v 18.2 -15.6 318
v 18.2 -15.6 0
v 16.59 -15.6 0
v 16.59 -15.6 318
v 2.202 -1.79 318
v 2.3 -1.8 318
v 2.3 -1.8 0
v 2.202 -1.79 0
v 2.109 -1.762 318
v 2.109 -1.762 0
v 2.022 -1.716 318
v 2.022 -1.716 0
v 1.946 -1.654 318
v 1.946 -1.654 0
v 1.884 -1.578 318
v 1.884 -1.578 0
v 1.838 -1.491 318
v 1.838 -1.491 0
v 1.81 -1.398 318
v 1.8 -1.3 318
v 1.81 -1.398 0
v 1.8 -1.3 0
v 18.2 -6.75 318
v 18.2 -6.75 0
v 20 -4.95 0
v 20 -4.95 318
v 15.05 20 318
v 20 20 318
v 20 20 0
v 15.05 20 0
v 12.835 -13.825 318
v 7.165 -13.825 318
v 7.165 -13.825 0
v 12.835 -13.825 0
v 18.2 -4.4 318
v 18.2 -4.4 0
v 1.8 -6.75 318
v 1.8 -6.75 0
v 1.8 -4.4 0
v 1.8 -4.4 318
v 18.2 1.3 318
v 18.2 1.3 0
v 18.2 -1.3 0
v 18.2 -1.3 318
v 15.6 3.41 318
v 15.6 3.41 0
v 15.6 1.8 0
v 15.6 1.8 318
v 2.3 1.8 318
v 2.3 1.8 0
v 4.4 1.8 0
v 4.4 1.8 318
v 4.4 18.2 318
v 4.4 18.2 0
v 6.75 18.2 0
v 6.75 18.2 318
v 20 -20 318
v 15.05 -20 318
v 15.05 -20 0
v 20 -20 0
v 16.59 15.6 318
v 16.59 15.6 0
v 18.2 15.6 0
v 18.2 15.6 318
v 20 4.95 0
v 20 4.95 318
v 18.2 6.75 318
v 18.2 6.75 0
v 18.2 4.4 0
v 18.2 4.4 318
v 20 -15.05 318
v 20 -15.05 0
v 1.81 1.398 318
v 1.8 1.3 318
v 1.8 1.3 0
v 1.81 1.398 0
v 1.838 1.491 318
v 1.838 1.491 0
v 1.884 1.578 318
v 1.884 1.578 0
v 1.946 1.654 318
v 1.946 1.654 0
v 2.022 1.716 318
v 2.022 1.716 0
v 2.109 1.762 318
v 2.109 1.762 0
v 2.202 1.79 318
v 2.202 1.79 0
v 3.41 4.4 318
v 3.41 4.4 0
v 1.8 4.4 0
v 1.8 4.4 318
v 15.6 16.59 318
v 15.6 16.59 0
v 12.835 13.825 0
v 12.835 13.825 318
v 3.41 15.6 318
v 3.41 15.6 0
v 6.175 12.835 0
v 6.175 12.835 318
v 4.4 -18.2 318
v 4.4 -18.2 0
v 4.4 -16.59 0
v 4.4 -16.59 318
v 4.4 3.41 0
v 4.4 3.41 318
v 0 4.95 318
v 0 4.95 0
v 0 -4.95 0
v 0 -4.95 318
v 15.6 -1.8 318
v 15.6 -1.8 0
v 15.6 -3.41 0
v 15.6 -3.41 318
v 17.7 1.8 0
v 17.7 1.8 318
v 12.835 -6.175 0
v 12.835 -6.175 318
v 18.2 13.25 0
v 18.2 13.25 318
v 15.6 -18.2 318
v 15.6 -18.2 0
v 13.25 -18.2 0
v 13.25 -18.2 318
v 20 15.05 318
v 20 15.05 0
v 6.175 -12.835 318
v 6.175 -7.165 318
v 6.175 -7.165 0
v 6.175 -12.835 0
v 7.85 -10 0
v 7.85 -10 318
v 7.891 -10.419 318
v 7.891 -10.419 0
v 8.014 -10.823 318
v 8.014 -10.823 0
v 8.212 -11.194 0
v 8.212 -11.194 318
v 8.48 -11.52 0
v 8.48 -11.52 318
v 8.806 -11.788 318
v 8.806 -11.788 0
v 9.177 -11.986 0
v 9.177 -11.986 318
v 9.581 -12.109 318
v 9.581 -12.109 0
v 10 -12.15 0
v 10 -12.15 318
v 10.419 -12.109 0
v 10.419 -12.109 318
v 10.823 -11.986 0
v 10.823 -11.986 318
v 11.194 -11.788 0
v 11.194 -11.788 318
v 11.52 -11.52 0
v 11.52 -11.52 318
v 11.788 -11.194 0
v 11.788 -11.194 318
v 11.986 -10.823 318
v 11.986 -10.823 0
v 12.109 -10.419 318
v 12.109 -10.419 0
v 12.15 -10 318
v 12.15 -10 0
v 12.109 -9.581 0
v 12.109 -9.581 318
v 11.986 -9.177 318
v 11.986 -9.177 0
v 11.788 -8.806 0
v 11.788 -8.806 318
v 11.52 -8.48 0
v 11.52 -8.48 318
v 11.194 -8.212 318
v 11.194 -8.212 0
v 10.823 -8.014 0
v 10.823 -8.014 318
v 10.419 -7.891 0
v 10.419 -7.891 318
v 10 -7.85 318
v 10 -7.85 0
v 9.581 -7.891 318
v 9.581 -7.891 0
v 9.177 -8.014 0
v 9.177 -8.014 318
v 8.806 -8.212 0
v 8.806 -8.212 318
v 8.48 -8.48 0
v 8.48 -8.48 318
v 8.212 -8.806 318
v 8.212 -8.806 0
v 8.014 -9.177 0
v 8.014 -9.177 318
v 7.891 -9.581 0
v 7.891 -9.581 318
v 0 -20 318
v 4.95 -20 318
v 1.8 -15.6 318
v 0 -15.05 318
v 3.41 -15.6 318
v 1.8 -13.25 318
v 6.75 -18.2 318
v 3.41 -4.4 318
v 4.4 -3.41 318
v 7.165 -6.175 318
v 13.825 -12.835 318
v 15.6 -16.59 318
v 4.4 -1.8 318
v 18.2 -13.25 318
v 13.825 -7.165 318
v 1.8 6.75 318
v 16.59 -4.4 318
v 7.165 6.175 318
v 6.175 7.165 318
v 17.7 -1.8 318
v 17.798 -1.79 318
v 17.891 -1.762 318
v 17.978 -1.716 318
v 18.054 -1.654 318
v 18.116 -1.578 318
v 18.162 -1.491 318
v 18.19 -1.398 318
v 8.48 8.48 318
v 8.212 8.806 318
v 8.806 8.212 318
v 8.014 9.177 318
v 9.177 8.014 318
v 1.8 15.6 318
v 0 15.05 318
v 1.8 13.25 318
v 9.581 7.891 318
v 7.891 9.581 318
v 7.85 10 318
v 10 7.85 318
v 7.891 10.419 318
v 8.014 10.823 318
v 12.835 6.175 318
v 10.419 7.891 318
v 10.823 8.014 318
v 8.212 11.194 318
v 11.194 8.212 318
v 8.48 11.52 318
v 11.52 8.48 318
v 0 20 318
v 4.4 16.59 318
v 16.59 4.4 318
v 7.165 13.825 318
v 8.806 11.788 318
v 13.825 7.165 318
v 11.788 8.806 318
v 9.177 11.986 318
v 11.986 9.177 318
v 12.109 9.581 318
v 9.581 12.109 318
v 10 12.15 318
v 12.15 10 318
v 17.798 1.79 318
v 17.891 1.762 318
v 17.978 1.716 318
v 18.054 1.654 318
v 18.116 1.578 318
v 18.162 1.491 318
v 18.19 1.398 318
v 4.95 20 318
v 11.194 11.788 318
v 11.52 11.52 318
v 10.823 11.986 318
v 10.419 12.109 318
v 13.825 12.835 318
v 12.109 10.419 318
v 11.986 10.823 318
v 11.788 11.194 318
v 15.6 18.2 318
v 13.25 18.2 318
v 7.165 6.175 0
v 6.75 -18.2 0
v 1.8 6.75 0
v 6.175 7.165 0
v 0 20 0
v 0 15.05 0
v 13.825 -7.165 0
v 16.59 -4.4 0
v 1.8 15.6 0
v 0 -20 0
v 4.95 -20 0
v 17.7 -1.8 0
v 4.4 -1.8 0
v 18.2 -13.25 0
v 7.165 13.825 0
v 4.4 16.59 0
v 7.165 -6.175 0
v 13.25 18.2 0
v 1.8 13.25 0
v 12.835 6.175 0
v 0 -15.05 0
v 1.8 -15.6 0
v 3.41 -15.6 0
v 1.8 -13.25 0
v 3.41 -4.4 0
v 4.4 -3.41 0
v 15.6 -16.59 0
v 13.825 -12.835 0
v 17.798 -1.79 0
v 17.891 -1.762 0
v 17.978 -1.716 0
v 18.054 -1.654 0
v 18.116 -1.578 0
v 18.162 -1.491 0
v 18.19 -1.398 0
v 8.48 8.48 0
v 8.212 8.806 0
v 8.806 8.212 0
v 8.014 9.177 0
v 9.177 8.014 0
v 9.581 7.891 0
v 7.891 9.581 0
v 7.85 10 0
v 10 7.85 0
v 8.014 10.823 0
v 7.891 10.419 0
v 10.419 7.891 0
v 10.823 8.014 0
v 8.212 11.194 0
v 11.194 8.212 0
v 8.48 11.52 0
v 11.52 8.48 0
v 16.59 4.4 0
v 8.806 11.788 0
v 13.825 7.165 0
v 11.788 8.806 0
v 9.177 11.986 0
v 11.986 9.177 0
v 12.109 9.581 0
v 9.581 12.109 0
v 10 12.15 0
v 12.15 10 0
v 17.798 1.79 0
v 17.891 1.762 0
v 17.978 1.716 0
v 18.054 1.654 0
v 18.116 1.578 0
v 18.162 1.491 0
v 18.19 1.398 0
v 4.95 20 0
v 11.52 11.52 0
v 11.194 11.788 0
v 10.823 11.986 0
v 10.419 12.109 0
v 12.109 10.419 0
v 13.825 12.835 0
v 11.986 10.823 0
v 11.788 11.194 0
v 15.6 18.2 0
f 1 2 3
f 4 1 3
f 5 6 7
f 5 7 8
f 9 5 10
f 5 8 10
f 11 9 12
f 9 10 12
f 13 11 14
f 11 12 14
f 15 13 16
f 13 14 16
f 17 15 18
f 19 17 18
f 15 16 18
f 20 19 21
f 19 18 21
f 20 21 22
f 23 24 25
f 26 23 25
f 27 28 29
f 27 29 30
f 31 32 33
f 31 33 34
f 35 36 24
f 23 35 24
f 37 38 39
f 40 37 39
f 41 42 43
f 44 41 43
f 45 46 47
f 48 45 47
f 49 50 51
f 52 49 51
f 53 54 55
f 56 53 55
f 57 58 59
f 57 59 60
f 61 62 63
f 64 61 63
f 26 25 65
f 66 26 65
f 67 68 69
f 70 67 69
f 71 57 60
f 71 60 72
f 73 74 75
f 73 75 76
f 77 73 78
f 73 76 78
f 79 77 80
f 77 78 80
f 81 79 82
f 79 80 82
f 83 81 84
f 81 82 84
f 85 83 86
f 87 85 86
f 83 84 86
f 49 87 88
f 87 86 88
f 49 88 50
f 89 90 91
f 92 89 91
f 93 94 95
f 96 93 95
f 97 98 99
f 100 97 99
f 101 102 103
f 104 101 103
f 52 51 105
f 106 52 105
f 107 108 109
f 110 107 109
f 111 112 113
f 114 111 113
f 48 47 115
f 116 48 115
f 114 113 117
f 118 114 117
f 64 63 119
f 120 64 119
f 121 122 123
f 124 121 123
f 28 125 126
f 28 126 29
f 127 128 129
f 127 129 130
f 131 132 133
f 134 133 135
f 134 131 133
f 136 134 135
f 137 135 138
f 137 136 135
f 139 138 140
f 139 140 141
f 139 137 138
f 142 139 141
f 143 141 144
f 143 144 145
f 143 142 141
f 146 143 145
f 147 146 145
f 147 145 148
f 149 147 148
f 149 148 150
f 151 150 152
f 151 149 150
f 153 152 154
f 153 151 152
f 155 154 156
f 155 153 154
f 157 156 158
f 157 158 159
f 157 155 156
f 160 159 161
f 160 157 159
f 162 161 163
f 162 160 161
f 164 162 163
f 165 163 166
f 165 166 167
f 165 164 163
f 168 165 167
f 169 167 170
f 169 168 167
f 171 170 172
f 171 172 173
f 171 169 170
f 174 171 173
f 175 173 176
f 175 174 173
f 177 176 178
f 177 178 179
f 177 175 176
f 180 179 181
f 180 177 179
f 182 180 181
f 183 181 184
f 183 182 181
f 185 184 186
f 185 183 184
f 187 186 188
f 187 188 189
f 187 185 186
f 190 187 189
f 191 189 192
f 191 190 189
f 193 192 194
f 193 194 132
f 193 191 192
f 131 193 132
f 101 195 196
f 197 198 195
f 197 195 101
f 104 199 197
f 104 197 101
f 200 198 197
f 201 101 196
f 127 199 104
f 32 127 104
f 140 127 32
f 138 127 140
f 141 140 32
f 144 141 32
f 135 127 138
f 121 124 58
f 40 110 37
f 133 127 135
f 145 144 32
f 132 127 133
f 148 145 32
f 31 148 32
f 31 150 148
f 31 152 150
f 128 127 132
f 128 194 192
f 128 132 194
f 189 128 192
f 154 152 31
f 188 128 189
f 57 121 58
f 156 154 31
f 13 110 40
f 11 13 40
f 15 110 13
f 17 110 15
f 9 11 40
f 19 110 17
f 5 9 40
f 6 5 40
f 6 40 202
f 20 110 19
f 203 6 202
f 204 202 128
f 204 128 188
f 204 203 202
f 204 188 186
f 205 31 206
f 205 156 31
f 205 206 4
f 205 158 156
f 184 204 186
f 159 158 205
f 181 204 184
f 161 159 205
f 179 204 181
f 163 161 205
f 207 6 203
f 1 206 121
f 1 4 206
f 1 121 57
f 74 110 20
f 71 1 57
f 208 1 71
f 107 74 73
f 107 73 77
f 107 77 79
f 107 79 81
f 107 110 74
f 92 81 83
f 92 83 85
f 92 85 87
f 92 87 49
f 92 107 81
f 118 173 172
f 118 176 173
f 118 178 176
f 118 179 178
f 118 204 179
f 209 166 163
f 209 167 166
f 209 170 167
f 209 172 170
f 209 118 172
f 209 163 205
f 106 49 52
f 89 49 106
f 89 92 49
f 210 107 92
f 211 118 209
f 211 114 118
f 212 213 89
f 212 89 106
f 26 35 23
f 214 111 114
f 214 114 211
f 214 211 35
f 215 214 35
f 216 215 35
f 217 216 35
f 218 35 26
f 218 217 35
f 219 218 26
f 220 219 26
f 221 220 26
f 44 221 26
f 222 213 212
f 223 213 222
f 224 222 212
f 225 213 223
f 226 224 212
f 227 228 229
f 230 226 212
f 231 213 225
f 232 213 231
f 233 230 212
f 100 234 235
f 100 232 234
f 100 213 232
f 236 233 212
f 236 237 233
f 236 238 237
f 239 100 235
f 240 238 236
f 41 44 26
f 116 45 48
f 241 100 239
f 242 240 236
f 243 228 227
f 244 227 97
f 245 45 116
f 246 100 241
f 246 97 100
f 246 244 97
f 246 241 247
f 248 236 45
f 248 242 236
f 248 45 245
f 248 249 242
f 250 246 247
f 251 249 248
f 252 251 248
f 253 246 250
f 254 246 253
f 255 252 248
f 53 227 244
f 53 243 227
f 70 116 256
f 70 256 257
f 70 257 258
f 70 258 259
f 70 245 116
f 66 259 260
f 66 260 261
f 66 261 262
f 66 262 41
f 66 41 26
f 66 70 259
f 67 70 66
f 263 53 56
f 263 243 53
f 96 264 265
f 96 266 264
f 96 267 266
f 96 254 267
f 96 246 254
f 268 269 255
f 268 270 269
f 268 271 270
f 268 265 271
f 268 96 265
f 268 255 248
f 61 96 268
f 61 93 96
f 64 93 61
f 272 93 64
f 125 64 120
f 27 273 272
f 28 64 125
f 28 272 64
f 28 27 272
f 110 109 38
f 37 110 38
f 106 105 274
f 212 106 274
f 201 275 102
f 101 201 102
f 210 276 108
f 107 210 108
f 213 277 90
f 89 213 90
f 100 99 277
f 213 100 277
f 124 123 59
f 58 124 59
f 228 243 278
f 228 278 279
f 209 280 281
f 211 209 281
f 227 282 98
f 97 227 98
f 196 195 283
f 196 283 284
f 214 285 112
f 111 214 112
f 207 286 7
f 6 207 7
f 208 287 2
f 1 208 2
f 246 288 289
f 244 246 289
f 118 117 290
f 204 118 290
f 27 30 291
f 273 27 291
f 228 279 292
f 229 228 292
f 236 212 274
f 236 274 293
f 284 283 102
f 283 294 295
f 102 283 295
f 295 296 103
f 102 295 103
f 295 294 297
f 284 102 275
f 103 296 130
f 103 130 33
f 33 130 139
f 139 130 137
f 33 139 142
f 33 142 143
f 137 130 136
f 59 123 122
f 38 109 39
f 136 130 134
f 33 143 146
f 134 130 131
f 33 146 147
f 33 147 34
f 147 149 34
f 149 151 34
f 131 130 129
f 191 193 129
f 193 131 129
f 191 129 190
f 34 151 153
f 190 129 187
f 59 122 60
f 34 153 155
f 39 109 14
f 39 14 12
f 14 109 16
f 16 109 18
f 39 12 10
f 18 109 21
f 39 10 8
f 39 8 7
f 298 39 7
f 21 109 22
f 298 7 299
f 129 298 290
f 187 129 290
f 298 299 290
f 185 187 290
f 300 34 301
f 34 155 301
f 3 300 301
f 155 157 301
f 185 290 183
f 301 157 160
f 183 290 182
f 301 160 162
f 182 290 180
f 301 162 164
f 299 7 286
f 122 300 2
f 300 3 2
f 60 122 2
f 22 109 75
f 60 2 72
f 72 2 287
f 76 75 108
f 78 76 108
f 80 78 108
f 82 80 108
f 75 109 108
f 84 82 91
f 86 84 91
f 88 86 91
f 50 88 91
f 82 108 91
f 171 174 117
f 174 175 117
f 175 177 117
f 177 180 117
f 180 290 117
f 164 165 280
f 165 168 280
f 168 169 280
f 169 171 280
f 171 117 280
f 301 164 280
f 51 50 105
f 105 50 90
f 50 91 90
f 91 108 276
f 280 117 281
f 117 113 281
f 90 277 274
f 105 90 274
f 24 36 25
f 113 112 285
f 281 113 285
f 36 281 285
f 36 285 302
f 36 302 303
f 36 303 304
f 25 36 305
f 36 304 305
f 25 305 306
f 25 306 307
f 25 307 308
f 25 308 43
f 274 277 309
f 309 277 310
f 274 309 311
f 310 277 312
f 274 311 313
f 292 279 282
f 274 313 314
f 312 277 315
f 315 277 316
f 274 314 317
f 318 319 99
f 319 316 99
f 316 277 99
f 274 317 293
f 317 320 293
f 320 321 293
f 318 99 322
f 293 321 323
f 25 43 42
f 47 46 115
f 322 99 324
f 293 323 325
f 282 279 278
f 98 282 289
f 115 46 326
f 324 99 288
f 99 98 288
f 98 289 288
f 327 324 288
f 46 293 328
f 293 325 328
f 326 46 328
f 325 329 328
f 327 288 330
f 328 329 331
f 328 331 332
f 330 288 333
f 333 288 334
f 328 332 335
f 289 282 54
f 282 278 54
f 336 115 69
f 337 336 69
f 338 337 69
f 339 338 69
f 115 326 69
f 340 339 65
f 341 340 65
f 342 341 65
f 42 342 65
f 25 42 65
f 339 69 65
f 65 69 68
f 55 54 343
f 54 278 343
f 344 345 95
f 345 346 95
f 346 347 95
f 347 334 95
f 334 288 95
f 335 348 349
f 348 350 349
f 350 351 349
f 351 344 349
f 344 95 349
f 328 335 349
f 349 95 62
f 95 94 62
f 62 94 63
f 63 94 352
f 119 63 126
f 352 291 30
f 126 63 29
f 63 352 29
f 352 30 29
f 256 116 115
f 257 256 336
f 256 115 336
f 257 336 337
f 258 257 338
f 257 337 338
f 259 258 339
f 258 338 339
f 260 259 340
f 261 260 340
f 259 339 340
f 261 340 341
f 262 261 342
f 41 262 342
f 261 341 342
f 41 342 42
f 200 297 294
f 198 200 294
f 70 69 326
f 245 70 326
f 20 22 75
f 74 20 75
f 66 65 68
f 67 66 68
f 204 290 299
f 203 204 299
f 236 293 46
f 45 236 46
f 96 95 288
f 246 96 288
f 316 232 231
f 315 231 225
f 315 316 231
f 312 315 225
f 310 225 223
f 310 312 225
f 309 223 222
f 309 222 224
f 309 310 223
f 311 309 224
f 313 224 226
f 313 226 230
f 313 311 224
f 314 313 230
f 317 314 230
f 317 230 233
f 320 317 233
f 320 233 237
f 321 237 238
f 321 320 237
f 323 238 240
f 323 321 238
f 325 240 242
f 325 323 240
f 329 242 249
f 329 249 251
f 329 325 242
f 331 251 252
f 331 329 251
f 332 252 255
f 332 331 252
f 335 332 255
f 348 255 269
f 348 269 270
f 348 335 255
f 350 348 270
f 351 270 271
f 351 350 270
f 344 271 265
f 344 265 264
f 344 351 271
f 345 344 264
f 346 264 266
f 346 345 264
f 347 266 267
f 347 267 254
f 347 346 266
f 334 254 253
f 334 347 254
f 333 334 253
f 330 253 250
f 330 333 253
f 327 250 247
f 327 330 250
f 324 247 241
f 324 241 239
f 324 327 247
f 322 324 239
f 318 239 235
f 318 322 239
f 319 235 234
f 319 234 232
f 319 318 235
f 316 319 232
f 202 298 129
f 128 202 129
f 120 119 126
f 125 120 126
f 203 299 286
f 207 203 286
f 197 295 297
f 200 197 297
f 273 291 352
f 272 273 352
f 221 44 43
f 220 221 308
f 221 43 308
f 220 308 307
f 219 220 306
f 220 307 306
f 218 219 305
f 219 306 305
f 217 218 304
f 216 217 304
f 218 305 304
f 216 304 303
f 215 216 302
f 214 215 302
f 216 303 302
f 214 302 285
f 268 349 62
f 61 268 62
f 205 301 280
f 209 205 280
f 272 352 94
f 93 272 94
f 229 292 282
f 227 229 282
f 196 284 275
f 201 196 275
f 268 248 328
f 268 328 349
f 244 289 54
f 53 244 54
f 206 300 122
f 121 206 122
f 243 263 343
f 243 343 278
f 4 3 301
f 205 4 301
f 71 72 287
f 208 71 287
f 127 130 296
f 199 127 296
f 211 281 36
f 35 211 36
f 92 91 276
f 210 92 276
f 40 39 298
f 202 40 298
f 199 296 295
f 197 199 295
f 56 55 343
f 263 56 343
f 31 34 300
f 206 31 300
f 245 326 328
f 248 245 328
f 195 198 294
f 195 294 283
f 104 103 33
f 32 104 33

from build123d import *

# Parameters (mm, degrees)
CROQUIS1_R              = 2.15
SALIENTE_EXTRUIR1_DEPTH = 318


with BuildPart() as part:
    # Croquis1 → Saliente-Extruir1 (new body)
    with BuildSketch(Plane.XY):
        Polygon((20, 4.95), (18.2, 6.75), (18.2, 4.4), (16.589949494, 4.4), (13.825, 7.164949494), (13.825, 12.835050506), (16.589949494, 15.6), (18.2, 15.6), (18.2, 13.25), (20, 15.05), (20, 20), (15.05, 20), (13.25, 18.2), (15.6, 18.2), (15.6, 16.589949494), (12.835050506, 13.825), (7.164949494, 13.825), (4.4, 16.589949494), (4.4, 18.2), (6.75, 18.2), (4.95, 20), (0, 20), (0, 15.05), (1.8, 13.25), (1.8, 15.6), (3.410050506, 15.6), (6.175, 12.835050506), (6.175, 7.164949494), (3.410050506, 4.4), (1.8, 4.4), (1.8, 6.75), (0, 4.95), (0, -4.95), (1.8, -6.75), (1.8, -4.4), (3.410050506, -4.4), (6.175, -7.164949494), (6.175, -12.835050506), (3.410050506, -15.6), (1.8, -15.6), (1.8, -13.25), (0, -15.05), (0, -20), (4.95, -20), (6.75, -18.2), (4.4, -18.2), (4.4, -16.589949494), (7.164949494, -13.825), (12.835050506, -13.825), (15.6, -16.589949494), (15.6, -18.2), (13.25, -18.2), (15.05, -20), (20, -20), (20, -15.05), (18.2, -13.25), (18.2, -15.6), (16.589949494, -15.6), (13.825, -12.835050506), (13.825, -7.164949494), (16.589949494, -4.4), (18.2, -4.4), (18.2, -6.75), (20, -4.95), align=None)
        with BuildLine():
            Line((1.8, -1.3), (1.8, 1.3))
            ThreePointArc((1.8, 1.3), (1.946446609, 1.653553391), (2.3, 1.8))
            Line((2.3, 1.8), (4.4, 1.8))
            Line((4.4, 1.8), (4.4, 3.410050506))
            Line((4.4, 3.410050506), (7.164949494, 6.175))
            Line((7.164949494, 6.175), (12.835050506, 6.175))
            Line((12.835050506, 6.175), (15.6, 3.410050506))
            Line((15.6, 3.410050506), (15.6, 1.8))
            Line((15.6, 1.8), (17.7, 1.8))
            ThreePointArc((17.7, 1.8), (18.053553391, 1.653553391), (18.2, 1.3))
            Line((18.2, 1.3), (18.2, -1.3))
            ThreePointArc((18.2, -1.3), (18.053553391, -1.653553391), (17.7, -1.8))
            Line((17.7, -1.8), (15.6, -1.8))
            Line((15.6, -1.8), (15.6, -3.410050506))
            Line((15.6, -3.410050506), (12.835050506, -6.175))
            Line((12.835050506, -6.175), (7.164949494, -6.175))
            Line((7.164949494, -6.175), (4.4, -3.410050506))
            Line((4.4, -3.410050506), (4.4, -1.8))
            Line((4.4, -1.8), (2.3, -1.8))
            ThreePointArc((2.3, -1.8), (1.946446609, -1.653553391), (1.8, -1.3))
        make_face(mode=Mode.SUBTRACT)
        with Locations(Location((10, -10, 0), (0, 0, 180))):
            Circle(CROQUIS1_R, mode=Mode.SUBTRACT)
        with Locations(Location((10, 10, 0), (0, 0, 180))):
            Circle(CROQUIS1_R, mode=Mode.SUBTRACT)
    extrude(amount=SALIENTE_EXTRUIR1_DEPTH)


solid = part.part
